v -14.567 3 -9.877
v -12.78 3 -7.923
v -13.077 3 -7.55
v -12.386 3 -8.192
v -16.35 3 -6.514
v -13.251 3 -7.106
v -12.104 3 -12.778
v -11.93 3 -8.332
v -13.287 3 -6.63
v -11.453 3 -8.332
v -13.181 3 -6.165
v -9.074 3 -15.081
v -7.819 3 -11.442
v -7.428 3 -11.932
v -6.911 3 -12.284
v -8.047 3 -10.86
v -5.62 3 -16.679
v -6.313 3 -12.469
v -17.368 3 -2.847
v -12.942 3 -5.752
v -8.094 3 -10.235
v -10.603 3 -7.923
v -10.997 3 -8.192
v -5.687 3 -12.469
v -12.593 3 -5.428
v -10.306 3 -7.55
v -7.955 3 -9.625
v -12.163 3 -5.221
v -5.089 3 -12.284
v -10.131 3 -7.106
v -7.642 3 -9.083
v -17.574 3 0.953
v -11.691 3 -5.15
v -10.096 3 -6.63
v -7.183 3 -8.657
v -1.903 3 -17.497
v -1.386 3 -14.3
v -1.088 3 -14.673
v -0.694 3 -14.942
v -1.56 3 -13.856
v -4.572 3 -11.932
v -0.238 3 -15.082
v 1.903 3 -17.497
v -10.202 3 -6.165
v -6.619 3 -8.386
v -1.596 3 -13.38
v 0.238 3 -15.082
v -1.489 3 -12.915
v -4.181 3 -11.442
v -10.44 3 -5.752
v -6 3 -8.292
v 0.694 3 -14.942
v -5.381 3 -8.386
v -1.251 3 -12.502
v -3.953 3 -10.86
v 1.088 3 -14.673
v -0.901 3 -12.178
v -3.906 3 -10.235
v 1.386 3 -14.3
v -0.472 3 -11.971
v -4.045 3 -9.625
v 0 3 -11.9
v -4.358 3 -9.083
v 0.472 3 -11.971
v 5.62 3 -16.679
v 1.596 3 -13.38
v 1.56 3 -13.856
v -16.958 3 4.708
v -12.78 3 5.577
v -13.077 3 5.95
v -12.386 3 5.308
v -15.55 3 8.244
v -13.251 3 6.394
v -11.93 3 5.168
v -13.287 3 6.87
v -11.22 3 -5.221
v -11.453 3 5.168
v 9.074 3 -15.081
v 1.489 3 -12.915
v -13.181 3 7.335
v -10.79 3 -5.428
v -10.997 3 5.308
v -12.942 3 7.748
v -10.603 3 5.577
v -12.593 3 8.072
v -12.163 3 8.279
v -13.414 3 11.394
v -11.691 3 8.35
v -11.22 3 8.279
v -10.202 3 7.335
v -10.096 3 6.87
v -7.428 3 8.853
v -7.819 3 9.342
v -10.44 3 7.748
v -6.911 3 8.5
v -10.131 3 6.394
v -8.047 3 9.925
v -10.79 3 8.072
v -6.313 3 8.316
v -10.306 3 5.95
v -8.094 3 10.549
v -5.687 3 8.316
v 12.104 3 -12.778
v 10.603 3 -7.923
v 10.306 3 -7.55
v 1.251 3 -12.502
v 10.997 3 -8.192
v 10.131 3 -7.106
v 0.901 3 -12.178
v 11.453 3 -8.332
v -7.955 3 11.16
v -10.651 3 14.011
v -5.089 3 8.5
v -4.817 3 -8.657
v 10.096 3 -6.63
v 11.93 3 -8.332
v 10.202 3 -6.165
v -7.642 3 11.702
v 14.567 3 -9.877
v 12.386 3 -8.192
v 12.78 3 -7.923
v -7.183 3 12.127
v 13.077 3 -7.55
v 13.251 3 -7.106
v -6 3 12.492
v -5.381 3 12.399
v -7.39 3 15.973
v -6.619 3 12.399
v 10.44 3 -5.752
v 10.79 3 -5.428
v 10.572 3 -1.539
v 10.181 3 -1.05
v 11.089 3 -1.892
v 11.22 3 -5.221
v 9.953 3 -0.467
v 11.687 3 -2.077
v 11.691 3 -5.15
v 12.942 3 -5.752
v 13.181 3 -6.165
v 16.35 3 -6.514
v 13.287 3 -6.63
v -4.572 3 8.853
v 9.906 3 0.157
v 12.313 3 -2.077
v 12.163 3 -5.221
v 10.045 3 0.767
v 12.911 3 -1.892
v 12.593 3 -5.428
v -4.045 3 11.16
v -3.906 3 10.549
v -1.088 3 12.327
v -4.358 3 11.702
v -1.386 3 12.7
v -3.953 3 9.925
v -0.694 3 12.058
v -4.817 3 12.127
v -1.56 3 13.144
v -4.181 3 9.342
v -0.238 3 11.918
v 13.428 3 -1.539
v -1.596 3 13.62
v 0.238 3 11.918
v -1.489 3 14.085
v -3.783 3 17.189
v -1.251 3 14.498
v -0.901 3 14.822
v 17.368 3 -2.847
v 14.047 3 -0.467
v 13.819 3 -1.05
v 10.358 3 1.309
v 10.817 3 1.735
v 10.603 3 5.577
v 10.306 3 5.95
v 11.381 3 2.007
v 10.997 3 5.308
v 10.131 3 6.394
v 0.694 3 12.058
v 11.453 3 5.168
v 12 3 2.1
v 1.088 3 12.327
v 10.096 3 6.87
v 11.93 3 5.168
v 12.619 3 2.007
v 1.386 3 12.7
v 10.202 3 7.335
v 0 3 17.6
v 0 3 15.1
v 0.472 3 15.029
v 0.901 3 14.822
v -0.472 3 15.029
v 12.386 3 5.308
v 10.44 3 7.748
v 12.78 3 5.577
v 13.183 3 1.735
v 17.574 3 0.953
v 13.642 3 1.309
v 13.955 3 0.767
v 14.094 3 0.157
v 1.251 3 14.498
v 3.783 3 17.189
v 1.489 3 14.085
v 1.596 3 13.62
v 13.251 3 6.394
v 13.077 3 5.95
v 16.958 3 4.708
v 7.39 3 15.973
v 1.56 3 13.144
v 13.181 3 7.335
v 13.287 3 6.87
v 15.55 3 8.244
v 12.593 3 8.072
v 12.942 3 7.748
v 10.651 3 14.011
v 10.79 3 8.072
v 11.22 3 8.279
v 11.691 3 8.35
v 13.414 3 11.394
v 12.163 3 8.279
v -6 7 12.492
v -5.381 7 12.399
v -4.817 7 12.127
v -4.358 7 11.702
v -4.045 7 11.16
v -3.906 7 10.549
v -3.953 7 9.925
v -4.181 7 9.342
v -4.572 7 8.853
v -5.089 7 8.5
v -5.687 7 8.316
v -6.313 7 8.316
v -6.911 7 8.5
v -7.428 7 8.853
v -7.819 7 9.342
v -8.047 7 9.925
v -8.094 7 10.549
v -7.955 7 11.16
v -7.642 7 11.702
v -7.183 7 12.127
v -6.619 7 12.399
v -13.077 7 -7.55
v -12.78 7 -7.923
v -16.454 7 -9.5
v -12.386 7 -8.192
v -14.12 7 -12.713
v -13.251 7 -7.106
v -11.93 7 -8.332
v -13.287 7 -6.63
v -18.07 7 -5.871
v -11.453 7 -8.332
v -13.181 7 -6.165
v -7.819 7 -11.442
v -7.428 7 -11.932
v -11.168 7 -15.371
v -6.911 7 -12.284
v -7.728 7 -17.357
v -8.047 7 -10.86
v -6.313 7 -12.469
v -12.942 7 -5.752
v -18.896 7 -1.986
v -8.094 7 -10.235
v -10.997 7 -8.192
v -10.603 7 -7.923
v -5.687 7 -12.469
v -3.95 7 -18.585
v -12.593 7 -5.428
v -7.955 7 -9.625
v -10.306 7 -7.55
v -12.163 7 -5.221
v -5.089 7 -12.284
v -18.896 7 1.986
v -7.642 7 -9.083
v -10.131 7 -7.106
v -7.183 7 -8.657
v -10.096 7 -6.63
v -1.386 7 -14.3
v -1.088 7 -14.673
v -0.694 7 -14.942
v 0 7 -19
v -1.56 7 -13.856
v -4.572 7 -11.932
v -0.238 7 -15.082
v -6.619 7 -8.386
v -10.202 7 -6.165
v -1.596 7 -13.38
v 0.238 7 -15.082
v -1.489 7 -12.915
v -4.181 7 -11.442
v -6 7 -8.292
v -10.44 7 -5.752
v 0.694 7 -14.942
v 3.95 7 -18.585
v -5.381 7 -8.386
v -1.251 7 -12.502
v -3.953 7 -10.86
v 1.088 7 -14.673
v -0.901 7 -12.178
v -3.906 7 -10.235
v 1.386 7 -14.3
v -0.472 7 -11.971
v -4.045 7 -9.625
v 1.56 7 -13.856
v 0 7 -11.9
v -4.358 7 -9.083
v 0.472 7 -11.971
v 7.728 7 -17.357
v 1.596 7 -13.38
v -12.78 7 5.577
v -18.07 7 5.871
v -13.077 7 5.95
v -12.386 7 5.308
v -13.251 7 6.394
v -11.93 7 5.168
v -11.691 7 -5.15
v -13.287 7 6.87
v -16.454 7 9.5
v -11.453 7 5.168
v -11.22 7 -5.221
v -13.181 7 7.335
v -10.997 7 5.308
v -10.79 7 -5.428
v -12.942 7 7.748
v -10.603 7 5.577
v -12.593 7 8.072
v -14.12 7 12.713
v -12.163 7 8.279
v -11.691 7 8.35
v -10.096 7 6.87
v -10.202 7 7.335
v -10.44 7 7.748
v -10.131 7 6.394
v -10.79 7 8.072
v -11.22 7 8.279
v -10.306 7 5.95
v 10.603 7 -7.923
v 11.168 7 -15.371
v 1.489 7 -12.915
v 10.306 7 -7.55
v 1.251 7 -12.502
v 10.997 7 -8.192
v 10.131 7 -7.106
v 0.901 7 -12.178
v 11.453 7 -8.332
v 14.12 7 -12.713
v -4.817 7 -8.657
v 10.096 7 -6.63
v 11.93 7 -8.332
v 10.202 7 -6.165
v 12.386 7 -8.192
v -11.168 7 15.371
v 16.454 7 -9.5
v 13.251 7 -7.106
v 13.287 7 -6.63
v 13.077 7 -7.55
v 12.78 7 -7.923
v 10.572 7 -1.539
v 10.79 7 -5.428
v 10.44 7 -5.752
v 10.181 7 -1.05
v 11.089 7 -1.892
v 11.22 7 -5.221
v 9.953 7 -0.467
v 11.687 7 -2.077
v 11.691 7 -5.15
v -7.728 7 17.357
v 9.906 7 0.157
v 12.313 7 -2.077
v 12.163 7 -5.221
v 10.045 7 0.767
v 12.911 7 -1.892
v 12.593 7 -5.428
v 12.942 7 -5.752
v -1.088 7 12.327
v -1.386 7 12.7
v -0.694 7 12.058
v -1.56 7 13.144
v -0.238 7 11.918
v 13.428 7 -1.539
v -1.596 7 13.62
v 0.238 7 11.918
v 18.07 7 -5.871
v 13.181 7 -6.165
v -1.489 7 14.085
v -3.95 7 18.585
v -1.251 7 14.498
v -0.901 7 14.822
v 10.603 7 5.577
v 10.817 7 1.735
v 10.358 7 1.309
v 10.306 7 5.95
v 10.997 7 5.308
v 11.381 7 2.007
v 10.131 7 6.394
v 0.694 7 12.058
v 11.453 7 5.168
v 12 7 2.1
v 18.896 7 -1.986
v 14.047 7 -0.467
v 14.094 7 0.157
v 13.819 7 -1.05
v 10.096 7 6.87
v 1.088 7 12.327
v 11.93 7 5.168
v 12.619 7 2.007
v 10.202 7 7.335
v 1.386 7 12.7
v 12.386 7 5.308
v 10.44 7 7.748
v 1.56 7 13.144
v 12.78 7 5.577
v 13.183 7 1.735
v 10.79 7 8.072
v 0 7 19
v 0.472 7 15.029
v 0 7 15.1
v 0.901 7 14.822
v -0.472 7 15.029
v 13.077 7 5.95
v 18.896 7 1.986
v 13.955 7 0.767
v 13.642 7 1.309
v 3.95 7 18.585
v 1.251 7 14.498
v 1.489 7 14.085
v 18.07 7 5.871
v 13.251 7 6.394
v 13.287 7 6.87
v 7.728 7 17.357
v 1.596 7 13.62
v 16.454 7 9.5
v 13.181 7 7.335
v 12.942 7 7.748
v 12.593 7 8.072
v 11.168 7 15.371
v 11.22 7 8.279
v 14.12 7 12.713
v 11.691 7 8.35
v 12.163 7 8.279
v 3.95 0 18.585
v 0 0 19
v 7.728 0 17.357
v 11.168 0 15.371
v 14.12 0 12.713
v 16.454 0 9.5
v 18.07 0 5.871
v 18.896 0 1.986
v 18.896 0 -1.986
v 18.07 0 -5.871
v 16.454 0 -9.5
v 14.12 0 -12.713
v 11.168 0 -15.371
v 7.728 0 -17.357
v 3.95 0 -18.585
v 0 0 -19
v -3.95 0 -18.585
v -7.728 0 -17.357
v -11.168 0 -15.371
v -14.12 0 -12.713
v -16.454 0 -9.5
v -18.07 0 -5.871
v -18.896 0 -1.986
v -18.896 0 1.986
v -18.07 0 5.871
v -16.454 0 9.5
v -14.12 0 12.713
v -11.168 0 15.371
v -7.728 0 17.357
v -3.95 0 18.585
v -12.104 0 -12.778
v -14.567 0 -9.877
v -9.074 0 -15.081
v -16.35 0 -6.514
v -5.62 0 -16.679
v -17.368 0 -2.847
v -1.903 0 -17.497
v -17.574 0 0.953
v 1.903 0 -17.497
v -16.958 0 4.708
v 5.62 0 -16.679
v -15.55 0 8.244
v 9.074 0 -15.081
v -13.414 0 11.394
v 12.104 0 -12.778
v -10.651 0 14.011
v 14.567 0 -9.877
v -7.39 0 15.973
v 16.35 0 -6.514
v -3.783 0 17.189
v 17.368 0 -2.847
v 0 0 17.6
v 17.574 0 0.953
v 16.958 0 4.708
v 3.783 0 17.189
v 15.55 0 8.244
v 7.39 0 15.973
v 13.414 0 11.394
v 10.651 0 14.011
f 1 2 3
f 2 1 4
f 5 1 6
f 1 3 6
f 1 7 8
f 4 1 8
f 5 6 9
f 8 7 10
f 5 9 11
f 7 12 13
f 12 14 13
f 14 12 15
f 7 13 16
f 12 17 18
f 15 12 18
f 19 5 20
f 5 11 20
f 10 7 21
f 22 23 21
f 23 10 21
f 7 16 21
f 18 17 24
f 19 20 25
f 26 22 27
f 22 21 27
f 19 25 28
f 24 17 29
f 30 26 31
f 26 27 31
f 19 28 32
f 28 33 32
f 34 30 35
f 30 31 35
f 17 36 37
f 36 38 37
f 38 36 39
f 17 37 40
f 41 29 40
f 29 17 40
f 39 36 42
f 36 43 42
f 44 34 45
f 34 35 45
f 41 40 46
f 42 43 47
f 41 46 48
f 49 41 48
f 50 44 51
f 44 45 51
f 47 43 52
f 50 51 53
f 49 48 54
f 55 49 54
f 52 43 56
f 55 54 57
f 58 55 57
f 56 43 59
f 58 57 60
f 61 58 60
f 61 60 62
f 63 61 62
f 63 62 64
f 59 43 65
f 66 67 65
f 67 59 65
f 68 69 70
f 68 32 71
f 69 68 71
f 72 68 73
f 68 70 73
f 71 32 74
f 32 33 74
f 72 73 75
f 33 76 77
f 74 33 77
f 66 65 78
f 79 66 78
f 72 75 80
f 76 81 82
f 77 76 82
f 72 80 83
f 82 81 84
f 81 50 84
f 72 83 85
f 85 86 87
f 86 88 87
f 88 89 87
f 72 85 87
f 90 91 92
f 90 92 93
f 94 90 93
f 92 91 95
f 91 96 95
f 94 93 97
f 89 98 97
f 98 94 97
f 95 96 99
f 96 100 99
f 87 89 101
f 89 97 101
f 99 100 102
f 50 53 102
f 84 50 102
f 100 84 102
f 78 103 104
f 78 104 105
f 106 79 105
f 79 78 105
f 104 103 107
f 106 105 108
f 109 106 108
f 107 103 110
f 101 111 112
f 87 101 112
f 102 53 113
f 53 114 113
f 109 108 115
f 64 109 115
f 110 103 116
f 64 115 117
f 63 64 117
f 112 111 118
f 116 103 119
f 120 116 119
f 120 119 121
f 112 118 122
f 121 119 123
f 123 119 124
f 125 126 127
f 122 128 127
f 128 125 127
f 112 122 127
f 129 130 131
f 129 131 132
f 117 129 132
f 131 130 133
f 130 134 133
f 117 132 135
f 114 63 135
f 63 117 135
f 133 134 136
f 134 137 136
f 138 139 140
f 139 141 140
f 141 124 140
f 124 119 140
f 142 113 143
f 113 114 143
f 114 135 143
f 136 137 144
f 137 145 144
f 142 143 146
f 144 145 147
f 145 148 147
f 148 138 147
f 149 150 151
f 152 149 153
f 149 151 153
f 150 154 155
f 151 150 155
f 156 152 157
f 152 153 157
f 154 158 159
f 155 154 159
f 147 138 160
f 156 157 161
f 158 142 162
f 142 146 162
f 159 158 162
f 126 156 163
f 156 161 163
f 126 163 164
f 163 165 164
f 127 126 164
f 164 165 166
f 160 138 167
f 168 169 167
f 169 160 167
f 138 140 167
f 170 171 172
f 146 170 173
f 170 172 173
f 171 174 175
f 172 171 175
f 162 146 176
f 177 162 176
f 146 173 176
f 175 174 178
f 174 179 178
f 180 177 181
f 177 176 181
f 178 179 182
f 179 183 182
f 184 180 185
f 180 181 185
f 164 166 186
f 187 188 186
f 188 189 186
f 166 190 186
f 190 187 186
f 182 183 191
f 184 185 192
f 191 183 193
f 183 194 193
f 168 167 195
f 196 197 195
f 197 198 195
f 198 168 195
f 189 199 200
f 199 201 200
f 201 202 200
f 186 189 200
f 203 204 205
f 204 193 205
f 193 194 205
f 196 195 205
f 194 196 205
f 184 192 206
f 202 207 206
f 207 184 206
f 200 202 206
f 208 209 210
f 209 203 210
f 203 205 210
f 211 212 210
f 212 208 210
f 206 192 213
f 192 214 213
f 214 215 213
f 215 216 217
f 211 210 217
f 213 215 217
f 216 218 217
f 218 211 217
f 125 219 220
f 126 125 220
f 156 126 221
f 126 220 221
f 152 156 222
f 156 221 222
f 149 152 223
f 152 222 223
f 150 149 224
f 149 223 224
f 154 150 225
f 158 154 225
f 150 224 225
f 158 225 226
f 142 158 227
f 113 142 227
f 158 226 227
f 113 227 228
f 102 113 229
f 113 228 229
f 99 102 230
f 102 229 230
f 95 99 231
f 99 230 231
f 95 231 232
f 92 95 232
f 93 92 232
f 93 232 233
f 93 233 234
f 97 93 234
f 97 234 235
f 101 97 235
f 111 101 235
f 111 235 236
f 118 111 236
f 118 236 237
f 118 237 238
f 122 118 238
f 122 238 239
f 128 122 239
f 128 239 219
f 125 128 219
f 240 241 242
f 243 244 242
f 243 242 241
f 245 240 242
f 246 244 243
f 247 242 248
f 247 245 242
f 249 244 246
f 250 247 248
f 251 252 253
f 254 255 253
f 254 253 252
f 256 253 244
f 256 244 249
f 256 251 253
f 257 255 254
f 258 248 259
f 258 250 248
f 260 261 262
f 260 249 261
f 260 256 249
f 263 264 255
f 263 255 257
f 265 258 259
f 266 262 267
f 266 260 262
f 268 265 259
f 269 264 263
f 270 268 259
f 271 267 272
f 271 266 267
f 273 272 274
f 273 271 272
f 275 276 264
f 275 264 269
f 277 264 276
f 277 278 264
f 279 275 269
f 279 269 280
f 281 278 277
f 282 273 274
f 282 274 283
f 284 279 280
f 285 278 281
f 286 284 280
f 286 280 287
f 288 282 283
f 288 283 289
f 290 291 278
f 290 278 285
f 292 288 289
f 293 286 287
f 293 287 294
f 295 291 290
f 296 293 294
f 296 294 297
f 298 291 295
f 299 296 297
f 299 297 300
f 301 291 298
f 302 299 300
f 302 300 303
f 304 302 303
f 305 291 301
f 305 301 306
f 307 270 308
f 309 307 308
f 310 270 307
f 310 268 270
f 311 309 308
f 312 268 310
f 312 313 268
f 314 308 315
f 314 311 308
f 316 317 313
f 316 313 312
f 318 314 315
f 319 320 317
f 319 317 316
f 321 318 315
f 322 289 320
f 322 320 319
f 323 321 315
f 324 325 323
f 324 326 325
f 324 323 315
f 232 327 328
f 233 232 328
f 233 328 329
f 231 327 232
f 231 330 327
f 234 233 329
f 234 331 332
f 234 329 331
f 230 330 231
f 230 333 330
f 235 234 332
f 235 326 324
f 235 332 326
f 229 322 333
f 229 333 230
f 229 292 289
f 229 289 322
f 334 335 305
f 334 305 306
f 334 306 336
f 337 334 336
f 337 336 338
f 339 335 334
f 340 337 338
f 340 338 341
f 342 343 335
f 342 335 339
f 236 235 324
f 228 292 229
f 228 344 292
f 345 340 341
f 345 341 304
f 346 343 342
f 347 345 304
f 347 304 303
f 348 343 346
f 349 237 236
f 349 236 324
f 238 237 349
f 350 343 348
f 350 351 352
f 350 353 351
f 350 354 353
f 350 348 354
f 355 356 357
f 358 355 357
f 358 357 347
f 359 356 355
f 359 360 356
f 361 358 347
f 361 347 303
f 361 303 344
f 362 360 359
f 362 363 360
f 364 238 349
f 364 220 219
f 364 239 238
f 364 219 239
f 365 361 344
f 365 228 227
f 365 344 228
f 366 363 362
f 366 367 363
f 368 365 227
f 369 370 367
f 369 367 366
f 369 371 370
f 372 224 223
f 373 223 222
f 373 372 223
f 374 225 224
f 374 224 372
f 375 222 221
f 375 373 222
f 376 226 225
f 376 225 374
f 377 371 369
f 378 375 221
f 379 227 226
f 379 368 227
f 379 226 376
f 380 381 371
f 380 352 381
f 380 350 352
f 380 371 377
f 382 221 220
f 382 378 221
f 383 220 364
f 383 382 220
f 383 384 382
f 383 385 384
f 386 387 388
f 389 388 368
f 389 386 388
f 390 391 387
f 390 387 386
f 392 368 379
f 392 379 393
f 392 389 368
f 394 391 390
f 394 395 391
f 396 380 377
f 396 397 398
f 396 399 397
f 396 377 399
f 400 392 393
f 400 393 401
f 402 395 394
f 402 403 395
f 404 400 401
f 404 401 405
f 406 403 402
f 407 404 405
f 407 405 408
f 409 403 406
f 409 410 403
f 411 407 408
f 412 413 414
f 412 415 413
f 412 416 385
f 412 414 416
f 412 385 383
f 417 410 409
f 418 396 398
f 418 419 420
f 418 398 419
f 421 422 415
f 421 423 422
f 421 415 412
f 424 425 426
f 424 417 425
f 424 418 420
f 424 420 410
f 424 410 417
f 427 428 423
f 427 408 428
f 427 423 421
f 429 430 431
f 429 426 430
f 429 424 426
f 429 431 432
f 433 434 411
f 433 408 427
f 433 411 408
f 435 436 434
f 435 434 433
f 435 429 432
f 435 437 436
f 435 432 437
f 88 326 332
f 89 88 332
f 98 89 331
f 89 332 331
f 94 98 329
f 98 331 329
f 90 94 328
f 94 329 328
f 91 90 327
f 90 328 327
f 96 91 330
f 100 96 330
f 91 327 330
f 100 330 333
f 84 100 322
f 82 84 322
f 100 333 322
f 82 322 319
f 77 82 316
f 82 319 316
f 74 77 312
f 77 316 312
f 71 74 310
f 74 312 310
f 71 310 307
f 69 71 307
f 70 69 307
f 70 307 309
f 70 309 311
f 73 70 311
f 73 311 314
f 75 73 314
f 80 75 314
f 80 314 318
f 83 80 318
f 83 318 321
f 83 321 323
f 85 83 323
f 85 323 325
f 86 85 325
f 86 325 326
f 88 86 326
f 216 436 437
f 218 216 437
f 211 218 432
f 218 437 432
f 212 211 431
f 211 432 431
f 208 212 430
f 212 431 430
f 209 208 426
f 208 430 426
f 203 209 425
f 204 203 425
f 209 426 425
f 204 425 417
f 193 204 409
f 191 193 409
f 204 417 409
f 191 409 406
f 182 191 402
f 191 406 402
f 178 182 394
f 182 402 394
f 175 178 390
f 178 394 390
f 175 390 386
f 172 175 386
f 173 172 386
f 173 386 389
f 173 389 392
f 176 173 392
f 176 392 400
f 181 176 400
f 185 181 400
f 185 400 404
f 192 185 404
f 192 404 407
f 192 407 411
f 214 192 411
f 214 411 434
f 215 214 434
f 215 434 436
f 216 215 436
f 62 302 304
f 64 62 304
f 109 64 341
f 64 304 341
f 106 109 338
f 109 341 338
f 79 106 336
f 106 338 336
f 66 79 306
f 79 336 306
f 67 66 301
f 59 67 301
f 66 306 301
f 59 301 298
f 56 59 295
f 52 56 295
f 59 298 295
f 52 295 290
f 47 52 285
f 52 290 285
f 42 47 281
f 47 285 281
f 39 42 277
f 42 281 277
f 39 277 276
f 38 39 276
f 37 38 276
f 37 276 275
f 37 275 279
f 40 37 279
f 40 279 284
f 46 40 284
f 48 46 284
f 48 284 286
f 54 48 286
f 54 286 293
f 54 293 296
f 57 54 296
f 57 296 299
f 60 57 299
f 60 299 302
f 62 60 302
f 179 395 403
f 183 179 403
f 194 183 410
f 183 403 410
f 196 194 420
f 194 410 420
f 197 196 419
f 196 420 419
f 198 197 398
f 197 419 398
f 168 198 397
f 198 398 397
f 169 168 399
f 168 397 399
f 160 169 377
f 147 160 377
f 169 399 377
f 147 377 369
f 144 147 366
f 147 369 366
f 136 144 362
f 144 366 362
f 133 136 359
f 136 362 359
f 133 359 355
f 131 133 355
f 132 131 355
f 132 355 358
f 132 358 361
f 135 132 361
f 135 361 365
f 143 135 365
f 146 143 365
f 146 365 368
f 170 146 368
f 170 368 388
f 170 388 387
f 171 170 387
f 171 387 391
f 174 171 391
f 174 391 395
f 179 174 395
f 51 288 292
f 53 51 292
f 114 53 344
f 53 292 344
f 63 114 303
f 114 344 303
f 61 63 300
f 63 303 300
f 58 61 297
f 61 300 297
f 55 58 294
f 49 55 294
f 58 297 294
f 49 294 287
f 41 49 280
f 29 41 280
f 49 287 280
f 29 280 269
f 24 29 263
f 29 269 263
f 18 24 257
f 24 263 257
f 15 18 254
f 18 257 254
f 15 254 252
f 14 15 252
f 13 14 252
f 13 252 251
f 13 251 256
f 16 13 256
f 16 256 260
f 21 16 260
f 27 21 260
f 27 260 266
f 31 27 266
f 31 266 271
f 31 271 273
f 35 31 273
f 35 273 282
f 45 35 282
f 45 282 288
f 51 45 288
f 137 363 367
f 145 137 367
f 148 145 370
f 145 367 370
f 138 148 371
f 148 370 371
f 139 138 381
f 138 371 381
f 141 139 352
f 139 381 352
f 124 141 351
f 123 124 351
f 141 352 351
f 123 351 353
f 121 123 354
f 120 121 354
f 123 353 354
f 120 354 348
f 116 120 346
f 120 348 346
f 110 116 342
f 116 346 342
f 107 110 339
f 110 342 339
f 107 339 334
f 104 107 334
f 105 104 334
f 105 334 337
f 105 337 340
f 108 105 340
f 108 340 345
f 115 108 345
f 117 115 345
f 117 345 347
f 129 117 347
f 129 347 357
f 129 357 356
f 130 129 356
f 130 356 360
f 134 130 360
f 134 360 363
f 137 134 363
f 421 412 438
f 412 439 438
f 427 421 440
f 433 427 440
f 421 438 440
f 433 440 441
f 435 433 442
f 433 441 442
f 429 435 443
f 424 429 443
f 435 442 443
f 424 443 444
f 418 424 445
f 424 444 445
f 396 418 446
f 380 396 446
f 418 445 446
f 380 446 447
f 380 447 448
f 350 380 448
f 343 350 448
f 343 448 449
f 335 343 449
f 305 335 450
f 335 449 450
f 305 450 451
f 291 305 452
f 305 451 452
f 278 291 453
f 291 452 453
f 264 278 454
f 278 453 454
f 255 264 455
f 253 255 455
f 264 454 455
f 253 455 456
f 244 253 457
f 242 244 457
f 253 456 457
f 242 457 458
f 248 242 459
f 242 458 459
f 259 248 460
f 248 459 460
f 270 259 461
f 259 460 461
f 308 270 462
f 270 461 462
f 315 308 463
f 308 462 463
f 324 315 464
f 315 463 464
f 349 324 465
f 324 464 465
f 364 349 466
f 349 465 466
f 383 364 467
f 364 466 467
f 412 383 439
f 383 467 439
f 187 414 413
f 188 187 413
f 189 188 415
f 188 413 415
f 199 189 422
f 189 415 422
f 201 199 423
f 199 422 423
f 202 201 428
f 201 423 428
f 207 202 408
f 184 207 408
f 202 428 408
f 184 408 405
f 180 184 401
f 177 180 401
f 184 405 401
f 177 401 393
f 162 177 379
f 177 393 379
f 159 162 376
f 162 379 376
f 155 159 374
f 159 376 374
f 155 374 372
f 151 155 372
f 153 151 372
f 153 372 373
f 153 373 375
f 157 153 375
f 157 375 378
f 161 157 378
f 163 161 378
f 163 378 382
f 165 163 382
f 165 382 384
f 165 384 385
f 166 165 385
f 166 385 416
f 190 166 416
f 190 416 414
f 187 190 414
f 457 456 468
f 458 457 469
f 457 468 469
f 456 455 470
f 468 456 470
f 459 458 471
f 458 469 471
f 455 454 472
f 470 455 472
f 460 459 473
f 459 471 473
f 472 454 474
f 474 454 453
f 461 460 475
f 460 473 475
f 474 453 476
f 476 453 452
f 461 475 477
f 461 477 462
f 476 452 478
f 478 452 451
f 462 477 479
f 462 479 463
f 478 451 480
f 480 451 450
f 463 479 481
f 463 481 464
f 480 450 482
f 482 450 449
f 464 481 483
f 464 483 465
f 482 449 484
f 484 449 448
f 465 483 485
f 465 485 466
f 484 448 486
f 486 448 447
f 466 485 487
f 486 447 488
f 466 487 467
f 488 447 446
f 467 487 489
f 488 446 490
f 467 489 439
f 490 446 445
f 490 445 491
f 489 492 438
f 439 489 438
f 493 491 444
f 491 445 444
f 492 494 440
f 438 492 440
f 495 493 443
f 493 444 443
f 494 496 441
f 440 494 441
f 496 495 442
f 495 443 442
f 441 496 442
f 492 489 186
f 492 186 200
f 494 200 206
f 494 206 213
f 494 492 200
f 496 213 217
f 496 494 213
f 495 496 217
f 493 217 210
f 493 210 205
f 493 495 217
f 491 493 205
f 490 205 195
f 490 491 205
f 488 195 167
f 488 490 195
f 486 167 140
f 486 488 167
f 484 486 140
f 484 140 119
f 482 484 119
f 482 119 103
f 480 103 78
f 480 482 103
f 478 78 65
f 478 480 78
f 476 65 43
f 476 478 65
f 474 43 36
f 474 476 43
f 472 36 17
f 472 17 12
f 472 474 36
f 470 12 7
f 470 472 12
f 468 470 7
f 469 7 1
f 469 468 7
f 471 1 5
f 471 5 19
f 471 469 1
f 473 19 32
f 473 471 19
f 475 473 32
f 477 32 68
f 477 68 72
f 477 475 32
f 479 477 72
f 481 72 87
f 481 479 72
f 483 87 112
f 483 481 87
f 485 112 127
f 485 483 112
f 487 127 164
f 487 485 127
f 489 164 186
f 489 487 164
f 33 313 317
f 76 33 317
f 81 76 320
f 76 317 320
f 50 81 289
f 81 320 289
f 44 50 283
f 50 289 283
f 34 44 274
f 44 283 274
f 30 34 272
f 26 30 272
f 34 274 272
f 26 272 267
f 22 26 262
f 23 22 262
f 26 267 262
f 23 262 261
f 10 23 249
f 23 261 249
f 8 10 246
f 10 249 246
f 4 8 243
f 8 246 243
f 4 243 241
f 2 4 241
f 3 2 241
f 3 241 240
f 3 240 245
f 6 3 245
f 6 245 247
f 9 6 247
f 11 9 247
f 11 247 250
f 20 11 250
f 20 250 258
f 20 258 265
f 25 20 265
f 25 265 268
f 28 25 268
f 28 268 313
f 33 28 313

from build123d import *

# Parameters (mm, degrees)
SKETCH_1_R          = 19
SKETCH_1_R_2        = 17.6
EXTRUDE_1_DEPTH     = 3
SKETCH_2_R          = 19
EXTRUDE_2_DEPTH     = 4
SKETCH_3_R          = 1.6
SKETCH_3_R_2        = 2.1
CUT_EXTRUDE_1_DEPTH = 28.766886754


with BuildPart() as part:
    # 草图1 → 凸台-拉伸1 (new body)
    with BuildSketch(Plane(origin=(0, 0, 0), x_dir=(1, 0, 0), z_dir=(0, 1, 0))):
        with Locations(Location((0, 0, 0), (0, 0, 270))):
            Circle(SKETCH_1_R)
        with Locations(Location((0, 0, 0), (0, 0, 270))):
            Circle(SKETCH_1_R_2, mode=Mode.SUBTRACT)
    extrude(amount=EXTRUDE_1_DEPTH)

    # 草图2 → 凸台-拉伸2 (add)
    with BuildSketch(Plane(origin=(0, 3, 0), x_dir=(1, 0, 0), z_dir=(0, 1, 0))):
        with Locations(Location((0, 0, 0), (0, 0, 270))):
            Circle(SKETCH_2_R)
    extrude(amount=EXTRUDE_2_DEPTH)

    # 草图3 → 切除-拉伸1 (cut, through all)
    with BuildSketch(Plane(origin=(0, 7, 0), x_dir=(1, 0, 0), z_dir=(0, 1, 0))):
        with Locations(Location((0, 13.5, 0), (0, 0, 270))):
            Circle(SKETCH_3_R)
        with Locations(Location((11.691342951, 6.75, 0), (0, 0, 270))):
            Circle(SKETCH_3_R)
        with Locations(Location((11.691342951, -6.75, 0), (0, 0, 270))):
            Circle(SKETCH_3_R)
        with Locations(Location((0, -13.5, 0), (0, 0, 270))):
            Circle(SKETCH_3_R)
        with Locations(Location((-11.691342951, -6.75, 0), (0, 0, 270))):
            Circle(SKETCH_3_R)
        with Locations(Location((-11.691342951, 6.75, 0), (0, 0, 270))):
            Circle(SKETCH_3_R)
        with Locations(Location((12, 0, 0), (0, 0, 270))):
            Circle(SKETCH_3_R_2)
        with Locations(Location((-6, -10.392304845, 0), (0, 0, 270))):
            Circle(SKETCH_3_R_2)
        with Locations(Location((-6, 10.392304845, 0), (0, 0, 270))):
            Circle(SKETCH_3_R_2)
    extrude(amount=-CUT_EXTRUDE_1_DEPTH, mode=Mode.SUBTRACT)


solid = part.part
